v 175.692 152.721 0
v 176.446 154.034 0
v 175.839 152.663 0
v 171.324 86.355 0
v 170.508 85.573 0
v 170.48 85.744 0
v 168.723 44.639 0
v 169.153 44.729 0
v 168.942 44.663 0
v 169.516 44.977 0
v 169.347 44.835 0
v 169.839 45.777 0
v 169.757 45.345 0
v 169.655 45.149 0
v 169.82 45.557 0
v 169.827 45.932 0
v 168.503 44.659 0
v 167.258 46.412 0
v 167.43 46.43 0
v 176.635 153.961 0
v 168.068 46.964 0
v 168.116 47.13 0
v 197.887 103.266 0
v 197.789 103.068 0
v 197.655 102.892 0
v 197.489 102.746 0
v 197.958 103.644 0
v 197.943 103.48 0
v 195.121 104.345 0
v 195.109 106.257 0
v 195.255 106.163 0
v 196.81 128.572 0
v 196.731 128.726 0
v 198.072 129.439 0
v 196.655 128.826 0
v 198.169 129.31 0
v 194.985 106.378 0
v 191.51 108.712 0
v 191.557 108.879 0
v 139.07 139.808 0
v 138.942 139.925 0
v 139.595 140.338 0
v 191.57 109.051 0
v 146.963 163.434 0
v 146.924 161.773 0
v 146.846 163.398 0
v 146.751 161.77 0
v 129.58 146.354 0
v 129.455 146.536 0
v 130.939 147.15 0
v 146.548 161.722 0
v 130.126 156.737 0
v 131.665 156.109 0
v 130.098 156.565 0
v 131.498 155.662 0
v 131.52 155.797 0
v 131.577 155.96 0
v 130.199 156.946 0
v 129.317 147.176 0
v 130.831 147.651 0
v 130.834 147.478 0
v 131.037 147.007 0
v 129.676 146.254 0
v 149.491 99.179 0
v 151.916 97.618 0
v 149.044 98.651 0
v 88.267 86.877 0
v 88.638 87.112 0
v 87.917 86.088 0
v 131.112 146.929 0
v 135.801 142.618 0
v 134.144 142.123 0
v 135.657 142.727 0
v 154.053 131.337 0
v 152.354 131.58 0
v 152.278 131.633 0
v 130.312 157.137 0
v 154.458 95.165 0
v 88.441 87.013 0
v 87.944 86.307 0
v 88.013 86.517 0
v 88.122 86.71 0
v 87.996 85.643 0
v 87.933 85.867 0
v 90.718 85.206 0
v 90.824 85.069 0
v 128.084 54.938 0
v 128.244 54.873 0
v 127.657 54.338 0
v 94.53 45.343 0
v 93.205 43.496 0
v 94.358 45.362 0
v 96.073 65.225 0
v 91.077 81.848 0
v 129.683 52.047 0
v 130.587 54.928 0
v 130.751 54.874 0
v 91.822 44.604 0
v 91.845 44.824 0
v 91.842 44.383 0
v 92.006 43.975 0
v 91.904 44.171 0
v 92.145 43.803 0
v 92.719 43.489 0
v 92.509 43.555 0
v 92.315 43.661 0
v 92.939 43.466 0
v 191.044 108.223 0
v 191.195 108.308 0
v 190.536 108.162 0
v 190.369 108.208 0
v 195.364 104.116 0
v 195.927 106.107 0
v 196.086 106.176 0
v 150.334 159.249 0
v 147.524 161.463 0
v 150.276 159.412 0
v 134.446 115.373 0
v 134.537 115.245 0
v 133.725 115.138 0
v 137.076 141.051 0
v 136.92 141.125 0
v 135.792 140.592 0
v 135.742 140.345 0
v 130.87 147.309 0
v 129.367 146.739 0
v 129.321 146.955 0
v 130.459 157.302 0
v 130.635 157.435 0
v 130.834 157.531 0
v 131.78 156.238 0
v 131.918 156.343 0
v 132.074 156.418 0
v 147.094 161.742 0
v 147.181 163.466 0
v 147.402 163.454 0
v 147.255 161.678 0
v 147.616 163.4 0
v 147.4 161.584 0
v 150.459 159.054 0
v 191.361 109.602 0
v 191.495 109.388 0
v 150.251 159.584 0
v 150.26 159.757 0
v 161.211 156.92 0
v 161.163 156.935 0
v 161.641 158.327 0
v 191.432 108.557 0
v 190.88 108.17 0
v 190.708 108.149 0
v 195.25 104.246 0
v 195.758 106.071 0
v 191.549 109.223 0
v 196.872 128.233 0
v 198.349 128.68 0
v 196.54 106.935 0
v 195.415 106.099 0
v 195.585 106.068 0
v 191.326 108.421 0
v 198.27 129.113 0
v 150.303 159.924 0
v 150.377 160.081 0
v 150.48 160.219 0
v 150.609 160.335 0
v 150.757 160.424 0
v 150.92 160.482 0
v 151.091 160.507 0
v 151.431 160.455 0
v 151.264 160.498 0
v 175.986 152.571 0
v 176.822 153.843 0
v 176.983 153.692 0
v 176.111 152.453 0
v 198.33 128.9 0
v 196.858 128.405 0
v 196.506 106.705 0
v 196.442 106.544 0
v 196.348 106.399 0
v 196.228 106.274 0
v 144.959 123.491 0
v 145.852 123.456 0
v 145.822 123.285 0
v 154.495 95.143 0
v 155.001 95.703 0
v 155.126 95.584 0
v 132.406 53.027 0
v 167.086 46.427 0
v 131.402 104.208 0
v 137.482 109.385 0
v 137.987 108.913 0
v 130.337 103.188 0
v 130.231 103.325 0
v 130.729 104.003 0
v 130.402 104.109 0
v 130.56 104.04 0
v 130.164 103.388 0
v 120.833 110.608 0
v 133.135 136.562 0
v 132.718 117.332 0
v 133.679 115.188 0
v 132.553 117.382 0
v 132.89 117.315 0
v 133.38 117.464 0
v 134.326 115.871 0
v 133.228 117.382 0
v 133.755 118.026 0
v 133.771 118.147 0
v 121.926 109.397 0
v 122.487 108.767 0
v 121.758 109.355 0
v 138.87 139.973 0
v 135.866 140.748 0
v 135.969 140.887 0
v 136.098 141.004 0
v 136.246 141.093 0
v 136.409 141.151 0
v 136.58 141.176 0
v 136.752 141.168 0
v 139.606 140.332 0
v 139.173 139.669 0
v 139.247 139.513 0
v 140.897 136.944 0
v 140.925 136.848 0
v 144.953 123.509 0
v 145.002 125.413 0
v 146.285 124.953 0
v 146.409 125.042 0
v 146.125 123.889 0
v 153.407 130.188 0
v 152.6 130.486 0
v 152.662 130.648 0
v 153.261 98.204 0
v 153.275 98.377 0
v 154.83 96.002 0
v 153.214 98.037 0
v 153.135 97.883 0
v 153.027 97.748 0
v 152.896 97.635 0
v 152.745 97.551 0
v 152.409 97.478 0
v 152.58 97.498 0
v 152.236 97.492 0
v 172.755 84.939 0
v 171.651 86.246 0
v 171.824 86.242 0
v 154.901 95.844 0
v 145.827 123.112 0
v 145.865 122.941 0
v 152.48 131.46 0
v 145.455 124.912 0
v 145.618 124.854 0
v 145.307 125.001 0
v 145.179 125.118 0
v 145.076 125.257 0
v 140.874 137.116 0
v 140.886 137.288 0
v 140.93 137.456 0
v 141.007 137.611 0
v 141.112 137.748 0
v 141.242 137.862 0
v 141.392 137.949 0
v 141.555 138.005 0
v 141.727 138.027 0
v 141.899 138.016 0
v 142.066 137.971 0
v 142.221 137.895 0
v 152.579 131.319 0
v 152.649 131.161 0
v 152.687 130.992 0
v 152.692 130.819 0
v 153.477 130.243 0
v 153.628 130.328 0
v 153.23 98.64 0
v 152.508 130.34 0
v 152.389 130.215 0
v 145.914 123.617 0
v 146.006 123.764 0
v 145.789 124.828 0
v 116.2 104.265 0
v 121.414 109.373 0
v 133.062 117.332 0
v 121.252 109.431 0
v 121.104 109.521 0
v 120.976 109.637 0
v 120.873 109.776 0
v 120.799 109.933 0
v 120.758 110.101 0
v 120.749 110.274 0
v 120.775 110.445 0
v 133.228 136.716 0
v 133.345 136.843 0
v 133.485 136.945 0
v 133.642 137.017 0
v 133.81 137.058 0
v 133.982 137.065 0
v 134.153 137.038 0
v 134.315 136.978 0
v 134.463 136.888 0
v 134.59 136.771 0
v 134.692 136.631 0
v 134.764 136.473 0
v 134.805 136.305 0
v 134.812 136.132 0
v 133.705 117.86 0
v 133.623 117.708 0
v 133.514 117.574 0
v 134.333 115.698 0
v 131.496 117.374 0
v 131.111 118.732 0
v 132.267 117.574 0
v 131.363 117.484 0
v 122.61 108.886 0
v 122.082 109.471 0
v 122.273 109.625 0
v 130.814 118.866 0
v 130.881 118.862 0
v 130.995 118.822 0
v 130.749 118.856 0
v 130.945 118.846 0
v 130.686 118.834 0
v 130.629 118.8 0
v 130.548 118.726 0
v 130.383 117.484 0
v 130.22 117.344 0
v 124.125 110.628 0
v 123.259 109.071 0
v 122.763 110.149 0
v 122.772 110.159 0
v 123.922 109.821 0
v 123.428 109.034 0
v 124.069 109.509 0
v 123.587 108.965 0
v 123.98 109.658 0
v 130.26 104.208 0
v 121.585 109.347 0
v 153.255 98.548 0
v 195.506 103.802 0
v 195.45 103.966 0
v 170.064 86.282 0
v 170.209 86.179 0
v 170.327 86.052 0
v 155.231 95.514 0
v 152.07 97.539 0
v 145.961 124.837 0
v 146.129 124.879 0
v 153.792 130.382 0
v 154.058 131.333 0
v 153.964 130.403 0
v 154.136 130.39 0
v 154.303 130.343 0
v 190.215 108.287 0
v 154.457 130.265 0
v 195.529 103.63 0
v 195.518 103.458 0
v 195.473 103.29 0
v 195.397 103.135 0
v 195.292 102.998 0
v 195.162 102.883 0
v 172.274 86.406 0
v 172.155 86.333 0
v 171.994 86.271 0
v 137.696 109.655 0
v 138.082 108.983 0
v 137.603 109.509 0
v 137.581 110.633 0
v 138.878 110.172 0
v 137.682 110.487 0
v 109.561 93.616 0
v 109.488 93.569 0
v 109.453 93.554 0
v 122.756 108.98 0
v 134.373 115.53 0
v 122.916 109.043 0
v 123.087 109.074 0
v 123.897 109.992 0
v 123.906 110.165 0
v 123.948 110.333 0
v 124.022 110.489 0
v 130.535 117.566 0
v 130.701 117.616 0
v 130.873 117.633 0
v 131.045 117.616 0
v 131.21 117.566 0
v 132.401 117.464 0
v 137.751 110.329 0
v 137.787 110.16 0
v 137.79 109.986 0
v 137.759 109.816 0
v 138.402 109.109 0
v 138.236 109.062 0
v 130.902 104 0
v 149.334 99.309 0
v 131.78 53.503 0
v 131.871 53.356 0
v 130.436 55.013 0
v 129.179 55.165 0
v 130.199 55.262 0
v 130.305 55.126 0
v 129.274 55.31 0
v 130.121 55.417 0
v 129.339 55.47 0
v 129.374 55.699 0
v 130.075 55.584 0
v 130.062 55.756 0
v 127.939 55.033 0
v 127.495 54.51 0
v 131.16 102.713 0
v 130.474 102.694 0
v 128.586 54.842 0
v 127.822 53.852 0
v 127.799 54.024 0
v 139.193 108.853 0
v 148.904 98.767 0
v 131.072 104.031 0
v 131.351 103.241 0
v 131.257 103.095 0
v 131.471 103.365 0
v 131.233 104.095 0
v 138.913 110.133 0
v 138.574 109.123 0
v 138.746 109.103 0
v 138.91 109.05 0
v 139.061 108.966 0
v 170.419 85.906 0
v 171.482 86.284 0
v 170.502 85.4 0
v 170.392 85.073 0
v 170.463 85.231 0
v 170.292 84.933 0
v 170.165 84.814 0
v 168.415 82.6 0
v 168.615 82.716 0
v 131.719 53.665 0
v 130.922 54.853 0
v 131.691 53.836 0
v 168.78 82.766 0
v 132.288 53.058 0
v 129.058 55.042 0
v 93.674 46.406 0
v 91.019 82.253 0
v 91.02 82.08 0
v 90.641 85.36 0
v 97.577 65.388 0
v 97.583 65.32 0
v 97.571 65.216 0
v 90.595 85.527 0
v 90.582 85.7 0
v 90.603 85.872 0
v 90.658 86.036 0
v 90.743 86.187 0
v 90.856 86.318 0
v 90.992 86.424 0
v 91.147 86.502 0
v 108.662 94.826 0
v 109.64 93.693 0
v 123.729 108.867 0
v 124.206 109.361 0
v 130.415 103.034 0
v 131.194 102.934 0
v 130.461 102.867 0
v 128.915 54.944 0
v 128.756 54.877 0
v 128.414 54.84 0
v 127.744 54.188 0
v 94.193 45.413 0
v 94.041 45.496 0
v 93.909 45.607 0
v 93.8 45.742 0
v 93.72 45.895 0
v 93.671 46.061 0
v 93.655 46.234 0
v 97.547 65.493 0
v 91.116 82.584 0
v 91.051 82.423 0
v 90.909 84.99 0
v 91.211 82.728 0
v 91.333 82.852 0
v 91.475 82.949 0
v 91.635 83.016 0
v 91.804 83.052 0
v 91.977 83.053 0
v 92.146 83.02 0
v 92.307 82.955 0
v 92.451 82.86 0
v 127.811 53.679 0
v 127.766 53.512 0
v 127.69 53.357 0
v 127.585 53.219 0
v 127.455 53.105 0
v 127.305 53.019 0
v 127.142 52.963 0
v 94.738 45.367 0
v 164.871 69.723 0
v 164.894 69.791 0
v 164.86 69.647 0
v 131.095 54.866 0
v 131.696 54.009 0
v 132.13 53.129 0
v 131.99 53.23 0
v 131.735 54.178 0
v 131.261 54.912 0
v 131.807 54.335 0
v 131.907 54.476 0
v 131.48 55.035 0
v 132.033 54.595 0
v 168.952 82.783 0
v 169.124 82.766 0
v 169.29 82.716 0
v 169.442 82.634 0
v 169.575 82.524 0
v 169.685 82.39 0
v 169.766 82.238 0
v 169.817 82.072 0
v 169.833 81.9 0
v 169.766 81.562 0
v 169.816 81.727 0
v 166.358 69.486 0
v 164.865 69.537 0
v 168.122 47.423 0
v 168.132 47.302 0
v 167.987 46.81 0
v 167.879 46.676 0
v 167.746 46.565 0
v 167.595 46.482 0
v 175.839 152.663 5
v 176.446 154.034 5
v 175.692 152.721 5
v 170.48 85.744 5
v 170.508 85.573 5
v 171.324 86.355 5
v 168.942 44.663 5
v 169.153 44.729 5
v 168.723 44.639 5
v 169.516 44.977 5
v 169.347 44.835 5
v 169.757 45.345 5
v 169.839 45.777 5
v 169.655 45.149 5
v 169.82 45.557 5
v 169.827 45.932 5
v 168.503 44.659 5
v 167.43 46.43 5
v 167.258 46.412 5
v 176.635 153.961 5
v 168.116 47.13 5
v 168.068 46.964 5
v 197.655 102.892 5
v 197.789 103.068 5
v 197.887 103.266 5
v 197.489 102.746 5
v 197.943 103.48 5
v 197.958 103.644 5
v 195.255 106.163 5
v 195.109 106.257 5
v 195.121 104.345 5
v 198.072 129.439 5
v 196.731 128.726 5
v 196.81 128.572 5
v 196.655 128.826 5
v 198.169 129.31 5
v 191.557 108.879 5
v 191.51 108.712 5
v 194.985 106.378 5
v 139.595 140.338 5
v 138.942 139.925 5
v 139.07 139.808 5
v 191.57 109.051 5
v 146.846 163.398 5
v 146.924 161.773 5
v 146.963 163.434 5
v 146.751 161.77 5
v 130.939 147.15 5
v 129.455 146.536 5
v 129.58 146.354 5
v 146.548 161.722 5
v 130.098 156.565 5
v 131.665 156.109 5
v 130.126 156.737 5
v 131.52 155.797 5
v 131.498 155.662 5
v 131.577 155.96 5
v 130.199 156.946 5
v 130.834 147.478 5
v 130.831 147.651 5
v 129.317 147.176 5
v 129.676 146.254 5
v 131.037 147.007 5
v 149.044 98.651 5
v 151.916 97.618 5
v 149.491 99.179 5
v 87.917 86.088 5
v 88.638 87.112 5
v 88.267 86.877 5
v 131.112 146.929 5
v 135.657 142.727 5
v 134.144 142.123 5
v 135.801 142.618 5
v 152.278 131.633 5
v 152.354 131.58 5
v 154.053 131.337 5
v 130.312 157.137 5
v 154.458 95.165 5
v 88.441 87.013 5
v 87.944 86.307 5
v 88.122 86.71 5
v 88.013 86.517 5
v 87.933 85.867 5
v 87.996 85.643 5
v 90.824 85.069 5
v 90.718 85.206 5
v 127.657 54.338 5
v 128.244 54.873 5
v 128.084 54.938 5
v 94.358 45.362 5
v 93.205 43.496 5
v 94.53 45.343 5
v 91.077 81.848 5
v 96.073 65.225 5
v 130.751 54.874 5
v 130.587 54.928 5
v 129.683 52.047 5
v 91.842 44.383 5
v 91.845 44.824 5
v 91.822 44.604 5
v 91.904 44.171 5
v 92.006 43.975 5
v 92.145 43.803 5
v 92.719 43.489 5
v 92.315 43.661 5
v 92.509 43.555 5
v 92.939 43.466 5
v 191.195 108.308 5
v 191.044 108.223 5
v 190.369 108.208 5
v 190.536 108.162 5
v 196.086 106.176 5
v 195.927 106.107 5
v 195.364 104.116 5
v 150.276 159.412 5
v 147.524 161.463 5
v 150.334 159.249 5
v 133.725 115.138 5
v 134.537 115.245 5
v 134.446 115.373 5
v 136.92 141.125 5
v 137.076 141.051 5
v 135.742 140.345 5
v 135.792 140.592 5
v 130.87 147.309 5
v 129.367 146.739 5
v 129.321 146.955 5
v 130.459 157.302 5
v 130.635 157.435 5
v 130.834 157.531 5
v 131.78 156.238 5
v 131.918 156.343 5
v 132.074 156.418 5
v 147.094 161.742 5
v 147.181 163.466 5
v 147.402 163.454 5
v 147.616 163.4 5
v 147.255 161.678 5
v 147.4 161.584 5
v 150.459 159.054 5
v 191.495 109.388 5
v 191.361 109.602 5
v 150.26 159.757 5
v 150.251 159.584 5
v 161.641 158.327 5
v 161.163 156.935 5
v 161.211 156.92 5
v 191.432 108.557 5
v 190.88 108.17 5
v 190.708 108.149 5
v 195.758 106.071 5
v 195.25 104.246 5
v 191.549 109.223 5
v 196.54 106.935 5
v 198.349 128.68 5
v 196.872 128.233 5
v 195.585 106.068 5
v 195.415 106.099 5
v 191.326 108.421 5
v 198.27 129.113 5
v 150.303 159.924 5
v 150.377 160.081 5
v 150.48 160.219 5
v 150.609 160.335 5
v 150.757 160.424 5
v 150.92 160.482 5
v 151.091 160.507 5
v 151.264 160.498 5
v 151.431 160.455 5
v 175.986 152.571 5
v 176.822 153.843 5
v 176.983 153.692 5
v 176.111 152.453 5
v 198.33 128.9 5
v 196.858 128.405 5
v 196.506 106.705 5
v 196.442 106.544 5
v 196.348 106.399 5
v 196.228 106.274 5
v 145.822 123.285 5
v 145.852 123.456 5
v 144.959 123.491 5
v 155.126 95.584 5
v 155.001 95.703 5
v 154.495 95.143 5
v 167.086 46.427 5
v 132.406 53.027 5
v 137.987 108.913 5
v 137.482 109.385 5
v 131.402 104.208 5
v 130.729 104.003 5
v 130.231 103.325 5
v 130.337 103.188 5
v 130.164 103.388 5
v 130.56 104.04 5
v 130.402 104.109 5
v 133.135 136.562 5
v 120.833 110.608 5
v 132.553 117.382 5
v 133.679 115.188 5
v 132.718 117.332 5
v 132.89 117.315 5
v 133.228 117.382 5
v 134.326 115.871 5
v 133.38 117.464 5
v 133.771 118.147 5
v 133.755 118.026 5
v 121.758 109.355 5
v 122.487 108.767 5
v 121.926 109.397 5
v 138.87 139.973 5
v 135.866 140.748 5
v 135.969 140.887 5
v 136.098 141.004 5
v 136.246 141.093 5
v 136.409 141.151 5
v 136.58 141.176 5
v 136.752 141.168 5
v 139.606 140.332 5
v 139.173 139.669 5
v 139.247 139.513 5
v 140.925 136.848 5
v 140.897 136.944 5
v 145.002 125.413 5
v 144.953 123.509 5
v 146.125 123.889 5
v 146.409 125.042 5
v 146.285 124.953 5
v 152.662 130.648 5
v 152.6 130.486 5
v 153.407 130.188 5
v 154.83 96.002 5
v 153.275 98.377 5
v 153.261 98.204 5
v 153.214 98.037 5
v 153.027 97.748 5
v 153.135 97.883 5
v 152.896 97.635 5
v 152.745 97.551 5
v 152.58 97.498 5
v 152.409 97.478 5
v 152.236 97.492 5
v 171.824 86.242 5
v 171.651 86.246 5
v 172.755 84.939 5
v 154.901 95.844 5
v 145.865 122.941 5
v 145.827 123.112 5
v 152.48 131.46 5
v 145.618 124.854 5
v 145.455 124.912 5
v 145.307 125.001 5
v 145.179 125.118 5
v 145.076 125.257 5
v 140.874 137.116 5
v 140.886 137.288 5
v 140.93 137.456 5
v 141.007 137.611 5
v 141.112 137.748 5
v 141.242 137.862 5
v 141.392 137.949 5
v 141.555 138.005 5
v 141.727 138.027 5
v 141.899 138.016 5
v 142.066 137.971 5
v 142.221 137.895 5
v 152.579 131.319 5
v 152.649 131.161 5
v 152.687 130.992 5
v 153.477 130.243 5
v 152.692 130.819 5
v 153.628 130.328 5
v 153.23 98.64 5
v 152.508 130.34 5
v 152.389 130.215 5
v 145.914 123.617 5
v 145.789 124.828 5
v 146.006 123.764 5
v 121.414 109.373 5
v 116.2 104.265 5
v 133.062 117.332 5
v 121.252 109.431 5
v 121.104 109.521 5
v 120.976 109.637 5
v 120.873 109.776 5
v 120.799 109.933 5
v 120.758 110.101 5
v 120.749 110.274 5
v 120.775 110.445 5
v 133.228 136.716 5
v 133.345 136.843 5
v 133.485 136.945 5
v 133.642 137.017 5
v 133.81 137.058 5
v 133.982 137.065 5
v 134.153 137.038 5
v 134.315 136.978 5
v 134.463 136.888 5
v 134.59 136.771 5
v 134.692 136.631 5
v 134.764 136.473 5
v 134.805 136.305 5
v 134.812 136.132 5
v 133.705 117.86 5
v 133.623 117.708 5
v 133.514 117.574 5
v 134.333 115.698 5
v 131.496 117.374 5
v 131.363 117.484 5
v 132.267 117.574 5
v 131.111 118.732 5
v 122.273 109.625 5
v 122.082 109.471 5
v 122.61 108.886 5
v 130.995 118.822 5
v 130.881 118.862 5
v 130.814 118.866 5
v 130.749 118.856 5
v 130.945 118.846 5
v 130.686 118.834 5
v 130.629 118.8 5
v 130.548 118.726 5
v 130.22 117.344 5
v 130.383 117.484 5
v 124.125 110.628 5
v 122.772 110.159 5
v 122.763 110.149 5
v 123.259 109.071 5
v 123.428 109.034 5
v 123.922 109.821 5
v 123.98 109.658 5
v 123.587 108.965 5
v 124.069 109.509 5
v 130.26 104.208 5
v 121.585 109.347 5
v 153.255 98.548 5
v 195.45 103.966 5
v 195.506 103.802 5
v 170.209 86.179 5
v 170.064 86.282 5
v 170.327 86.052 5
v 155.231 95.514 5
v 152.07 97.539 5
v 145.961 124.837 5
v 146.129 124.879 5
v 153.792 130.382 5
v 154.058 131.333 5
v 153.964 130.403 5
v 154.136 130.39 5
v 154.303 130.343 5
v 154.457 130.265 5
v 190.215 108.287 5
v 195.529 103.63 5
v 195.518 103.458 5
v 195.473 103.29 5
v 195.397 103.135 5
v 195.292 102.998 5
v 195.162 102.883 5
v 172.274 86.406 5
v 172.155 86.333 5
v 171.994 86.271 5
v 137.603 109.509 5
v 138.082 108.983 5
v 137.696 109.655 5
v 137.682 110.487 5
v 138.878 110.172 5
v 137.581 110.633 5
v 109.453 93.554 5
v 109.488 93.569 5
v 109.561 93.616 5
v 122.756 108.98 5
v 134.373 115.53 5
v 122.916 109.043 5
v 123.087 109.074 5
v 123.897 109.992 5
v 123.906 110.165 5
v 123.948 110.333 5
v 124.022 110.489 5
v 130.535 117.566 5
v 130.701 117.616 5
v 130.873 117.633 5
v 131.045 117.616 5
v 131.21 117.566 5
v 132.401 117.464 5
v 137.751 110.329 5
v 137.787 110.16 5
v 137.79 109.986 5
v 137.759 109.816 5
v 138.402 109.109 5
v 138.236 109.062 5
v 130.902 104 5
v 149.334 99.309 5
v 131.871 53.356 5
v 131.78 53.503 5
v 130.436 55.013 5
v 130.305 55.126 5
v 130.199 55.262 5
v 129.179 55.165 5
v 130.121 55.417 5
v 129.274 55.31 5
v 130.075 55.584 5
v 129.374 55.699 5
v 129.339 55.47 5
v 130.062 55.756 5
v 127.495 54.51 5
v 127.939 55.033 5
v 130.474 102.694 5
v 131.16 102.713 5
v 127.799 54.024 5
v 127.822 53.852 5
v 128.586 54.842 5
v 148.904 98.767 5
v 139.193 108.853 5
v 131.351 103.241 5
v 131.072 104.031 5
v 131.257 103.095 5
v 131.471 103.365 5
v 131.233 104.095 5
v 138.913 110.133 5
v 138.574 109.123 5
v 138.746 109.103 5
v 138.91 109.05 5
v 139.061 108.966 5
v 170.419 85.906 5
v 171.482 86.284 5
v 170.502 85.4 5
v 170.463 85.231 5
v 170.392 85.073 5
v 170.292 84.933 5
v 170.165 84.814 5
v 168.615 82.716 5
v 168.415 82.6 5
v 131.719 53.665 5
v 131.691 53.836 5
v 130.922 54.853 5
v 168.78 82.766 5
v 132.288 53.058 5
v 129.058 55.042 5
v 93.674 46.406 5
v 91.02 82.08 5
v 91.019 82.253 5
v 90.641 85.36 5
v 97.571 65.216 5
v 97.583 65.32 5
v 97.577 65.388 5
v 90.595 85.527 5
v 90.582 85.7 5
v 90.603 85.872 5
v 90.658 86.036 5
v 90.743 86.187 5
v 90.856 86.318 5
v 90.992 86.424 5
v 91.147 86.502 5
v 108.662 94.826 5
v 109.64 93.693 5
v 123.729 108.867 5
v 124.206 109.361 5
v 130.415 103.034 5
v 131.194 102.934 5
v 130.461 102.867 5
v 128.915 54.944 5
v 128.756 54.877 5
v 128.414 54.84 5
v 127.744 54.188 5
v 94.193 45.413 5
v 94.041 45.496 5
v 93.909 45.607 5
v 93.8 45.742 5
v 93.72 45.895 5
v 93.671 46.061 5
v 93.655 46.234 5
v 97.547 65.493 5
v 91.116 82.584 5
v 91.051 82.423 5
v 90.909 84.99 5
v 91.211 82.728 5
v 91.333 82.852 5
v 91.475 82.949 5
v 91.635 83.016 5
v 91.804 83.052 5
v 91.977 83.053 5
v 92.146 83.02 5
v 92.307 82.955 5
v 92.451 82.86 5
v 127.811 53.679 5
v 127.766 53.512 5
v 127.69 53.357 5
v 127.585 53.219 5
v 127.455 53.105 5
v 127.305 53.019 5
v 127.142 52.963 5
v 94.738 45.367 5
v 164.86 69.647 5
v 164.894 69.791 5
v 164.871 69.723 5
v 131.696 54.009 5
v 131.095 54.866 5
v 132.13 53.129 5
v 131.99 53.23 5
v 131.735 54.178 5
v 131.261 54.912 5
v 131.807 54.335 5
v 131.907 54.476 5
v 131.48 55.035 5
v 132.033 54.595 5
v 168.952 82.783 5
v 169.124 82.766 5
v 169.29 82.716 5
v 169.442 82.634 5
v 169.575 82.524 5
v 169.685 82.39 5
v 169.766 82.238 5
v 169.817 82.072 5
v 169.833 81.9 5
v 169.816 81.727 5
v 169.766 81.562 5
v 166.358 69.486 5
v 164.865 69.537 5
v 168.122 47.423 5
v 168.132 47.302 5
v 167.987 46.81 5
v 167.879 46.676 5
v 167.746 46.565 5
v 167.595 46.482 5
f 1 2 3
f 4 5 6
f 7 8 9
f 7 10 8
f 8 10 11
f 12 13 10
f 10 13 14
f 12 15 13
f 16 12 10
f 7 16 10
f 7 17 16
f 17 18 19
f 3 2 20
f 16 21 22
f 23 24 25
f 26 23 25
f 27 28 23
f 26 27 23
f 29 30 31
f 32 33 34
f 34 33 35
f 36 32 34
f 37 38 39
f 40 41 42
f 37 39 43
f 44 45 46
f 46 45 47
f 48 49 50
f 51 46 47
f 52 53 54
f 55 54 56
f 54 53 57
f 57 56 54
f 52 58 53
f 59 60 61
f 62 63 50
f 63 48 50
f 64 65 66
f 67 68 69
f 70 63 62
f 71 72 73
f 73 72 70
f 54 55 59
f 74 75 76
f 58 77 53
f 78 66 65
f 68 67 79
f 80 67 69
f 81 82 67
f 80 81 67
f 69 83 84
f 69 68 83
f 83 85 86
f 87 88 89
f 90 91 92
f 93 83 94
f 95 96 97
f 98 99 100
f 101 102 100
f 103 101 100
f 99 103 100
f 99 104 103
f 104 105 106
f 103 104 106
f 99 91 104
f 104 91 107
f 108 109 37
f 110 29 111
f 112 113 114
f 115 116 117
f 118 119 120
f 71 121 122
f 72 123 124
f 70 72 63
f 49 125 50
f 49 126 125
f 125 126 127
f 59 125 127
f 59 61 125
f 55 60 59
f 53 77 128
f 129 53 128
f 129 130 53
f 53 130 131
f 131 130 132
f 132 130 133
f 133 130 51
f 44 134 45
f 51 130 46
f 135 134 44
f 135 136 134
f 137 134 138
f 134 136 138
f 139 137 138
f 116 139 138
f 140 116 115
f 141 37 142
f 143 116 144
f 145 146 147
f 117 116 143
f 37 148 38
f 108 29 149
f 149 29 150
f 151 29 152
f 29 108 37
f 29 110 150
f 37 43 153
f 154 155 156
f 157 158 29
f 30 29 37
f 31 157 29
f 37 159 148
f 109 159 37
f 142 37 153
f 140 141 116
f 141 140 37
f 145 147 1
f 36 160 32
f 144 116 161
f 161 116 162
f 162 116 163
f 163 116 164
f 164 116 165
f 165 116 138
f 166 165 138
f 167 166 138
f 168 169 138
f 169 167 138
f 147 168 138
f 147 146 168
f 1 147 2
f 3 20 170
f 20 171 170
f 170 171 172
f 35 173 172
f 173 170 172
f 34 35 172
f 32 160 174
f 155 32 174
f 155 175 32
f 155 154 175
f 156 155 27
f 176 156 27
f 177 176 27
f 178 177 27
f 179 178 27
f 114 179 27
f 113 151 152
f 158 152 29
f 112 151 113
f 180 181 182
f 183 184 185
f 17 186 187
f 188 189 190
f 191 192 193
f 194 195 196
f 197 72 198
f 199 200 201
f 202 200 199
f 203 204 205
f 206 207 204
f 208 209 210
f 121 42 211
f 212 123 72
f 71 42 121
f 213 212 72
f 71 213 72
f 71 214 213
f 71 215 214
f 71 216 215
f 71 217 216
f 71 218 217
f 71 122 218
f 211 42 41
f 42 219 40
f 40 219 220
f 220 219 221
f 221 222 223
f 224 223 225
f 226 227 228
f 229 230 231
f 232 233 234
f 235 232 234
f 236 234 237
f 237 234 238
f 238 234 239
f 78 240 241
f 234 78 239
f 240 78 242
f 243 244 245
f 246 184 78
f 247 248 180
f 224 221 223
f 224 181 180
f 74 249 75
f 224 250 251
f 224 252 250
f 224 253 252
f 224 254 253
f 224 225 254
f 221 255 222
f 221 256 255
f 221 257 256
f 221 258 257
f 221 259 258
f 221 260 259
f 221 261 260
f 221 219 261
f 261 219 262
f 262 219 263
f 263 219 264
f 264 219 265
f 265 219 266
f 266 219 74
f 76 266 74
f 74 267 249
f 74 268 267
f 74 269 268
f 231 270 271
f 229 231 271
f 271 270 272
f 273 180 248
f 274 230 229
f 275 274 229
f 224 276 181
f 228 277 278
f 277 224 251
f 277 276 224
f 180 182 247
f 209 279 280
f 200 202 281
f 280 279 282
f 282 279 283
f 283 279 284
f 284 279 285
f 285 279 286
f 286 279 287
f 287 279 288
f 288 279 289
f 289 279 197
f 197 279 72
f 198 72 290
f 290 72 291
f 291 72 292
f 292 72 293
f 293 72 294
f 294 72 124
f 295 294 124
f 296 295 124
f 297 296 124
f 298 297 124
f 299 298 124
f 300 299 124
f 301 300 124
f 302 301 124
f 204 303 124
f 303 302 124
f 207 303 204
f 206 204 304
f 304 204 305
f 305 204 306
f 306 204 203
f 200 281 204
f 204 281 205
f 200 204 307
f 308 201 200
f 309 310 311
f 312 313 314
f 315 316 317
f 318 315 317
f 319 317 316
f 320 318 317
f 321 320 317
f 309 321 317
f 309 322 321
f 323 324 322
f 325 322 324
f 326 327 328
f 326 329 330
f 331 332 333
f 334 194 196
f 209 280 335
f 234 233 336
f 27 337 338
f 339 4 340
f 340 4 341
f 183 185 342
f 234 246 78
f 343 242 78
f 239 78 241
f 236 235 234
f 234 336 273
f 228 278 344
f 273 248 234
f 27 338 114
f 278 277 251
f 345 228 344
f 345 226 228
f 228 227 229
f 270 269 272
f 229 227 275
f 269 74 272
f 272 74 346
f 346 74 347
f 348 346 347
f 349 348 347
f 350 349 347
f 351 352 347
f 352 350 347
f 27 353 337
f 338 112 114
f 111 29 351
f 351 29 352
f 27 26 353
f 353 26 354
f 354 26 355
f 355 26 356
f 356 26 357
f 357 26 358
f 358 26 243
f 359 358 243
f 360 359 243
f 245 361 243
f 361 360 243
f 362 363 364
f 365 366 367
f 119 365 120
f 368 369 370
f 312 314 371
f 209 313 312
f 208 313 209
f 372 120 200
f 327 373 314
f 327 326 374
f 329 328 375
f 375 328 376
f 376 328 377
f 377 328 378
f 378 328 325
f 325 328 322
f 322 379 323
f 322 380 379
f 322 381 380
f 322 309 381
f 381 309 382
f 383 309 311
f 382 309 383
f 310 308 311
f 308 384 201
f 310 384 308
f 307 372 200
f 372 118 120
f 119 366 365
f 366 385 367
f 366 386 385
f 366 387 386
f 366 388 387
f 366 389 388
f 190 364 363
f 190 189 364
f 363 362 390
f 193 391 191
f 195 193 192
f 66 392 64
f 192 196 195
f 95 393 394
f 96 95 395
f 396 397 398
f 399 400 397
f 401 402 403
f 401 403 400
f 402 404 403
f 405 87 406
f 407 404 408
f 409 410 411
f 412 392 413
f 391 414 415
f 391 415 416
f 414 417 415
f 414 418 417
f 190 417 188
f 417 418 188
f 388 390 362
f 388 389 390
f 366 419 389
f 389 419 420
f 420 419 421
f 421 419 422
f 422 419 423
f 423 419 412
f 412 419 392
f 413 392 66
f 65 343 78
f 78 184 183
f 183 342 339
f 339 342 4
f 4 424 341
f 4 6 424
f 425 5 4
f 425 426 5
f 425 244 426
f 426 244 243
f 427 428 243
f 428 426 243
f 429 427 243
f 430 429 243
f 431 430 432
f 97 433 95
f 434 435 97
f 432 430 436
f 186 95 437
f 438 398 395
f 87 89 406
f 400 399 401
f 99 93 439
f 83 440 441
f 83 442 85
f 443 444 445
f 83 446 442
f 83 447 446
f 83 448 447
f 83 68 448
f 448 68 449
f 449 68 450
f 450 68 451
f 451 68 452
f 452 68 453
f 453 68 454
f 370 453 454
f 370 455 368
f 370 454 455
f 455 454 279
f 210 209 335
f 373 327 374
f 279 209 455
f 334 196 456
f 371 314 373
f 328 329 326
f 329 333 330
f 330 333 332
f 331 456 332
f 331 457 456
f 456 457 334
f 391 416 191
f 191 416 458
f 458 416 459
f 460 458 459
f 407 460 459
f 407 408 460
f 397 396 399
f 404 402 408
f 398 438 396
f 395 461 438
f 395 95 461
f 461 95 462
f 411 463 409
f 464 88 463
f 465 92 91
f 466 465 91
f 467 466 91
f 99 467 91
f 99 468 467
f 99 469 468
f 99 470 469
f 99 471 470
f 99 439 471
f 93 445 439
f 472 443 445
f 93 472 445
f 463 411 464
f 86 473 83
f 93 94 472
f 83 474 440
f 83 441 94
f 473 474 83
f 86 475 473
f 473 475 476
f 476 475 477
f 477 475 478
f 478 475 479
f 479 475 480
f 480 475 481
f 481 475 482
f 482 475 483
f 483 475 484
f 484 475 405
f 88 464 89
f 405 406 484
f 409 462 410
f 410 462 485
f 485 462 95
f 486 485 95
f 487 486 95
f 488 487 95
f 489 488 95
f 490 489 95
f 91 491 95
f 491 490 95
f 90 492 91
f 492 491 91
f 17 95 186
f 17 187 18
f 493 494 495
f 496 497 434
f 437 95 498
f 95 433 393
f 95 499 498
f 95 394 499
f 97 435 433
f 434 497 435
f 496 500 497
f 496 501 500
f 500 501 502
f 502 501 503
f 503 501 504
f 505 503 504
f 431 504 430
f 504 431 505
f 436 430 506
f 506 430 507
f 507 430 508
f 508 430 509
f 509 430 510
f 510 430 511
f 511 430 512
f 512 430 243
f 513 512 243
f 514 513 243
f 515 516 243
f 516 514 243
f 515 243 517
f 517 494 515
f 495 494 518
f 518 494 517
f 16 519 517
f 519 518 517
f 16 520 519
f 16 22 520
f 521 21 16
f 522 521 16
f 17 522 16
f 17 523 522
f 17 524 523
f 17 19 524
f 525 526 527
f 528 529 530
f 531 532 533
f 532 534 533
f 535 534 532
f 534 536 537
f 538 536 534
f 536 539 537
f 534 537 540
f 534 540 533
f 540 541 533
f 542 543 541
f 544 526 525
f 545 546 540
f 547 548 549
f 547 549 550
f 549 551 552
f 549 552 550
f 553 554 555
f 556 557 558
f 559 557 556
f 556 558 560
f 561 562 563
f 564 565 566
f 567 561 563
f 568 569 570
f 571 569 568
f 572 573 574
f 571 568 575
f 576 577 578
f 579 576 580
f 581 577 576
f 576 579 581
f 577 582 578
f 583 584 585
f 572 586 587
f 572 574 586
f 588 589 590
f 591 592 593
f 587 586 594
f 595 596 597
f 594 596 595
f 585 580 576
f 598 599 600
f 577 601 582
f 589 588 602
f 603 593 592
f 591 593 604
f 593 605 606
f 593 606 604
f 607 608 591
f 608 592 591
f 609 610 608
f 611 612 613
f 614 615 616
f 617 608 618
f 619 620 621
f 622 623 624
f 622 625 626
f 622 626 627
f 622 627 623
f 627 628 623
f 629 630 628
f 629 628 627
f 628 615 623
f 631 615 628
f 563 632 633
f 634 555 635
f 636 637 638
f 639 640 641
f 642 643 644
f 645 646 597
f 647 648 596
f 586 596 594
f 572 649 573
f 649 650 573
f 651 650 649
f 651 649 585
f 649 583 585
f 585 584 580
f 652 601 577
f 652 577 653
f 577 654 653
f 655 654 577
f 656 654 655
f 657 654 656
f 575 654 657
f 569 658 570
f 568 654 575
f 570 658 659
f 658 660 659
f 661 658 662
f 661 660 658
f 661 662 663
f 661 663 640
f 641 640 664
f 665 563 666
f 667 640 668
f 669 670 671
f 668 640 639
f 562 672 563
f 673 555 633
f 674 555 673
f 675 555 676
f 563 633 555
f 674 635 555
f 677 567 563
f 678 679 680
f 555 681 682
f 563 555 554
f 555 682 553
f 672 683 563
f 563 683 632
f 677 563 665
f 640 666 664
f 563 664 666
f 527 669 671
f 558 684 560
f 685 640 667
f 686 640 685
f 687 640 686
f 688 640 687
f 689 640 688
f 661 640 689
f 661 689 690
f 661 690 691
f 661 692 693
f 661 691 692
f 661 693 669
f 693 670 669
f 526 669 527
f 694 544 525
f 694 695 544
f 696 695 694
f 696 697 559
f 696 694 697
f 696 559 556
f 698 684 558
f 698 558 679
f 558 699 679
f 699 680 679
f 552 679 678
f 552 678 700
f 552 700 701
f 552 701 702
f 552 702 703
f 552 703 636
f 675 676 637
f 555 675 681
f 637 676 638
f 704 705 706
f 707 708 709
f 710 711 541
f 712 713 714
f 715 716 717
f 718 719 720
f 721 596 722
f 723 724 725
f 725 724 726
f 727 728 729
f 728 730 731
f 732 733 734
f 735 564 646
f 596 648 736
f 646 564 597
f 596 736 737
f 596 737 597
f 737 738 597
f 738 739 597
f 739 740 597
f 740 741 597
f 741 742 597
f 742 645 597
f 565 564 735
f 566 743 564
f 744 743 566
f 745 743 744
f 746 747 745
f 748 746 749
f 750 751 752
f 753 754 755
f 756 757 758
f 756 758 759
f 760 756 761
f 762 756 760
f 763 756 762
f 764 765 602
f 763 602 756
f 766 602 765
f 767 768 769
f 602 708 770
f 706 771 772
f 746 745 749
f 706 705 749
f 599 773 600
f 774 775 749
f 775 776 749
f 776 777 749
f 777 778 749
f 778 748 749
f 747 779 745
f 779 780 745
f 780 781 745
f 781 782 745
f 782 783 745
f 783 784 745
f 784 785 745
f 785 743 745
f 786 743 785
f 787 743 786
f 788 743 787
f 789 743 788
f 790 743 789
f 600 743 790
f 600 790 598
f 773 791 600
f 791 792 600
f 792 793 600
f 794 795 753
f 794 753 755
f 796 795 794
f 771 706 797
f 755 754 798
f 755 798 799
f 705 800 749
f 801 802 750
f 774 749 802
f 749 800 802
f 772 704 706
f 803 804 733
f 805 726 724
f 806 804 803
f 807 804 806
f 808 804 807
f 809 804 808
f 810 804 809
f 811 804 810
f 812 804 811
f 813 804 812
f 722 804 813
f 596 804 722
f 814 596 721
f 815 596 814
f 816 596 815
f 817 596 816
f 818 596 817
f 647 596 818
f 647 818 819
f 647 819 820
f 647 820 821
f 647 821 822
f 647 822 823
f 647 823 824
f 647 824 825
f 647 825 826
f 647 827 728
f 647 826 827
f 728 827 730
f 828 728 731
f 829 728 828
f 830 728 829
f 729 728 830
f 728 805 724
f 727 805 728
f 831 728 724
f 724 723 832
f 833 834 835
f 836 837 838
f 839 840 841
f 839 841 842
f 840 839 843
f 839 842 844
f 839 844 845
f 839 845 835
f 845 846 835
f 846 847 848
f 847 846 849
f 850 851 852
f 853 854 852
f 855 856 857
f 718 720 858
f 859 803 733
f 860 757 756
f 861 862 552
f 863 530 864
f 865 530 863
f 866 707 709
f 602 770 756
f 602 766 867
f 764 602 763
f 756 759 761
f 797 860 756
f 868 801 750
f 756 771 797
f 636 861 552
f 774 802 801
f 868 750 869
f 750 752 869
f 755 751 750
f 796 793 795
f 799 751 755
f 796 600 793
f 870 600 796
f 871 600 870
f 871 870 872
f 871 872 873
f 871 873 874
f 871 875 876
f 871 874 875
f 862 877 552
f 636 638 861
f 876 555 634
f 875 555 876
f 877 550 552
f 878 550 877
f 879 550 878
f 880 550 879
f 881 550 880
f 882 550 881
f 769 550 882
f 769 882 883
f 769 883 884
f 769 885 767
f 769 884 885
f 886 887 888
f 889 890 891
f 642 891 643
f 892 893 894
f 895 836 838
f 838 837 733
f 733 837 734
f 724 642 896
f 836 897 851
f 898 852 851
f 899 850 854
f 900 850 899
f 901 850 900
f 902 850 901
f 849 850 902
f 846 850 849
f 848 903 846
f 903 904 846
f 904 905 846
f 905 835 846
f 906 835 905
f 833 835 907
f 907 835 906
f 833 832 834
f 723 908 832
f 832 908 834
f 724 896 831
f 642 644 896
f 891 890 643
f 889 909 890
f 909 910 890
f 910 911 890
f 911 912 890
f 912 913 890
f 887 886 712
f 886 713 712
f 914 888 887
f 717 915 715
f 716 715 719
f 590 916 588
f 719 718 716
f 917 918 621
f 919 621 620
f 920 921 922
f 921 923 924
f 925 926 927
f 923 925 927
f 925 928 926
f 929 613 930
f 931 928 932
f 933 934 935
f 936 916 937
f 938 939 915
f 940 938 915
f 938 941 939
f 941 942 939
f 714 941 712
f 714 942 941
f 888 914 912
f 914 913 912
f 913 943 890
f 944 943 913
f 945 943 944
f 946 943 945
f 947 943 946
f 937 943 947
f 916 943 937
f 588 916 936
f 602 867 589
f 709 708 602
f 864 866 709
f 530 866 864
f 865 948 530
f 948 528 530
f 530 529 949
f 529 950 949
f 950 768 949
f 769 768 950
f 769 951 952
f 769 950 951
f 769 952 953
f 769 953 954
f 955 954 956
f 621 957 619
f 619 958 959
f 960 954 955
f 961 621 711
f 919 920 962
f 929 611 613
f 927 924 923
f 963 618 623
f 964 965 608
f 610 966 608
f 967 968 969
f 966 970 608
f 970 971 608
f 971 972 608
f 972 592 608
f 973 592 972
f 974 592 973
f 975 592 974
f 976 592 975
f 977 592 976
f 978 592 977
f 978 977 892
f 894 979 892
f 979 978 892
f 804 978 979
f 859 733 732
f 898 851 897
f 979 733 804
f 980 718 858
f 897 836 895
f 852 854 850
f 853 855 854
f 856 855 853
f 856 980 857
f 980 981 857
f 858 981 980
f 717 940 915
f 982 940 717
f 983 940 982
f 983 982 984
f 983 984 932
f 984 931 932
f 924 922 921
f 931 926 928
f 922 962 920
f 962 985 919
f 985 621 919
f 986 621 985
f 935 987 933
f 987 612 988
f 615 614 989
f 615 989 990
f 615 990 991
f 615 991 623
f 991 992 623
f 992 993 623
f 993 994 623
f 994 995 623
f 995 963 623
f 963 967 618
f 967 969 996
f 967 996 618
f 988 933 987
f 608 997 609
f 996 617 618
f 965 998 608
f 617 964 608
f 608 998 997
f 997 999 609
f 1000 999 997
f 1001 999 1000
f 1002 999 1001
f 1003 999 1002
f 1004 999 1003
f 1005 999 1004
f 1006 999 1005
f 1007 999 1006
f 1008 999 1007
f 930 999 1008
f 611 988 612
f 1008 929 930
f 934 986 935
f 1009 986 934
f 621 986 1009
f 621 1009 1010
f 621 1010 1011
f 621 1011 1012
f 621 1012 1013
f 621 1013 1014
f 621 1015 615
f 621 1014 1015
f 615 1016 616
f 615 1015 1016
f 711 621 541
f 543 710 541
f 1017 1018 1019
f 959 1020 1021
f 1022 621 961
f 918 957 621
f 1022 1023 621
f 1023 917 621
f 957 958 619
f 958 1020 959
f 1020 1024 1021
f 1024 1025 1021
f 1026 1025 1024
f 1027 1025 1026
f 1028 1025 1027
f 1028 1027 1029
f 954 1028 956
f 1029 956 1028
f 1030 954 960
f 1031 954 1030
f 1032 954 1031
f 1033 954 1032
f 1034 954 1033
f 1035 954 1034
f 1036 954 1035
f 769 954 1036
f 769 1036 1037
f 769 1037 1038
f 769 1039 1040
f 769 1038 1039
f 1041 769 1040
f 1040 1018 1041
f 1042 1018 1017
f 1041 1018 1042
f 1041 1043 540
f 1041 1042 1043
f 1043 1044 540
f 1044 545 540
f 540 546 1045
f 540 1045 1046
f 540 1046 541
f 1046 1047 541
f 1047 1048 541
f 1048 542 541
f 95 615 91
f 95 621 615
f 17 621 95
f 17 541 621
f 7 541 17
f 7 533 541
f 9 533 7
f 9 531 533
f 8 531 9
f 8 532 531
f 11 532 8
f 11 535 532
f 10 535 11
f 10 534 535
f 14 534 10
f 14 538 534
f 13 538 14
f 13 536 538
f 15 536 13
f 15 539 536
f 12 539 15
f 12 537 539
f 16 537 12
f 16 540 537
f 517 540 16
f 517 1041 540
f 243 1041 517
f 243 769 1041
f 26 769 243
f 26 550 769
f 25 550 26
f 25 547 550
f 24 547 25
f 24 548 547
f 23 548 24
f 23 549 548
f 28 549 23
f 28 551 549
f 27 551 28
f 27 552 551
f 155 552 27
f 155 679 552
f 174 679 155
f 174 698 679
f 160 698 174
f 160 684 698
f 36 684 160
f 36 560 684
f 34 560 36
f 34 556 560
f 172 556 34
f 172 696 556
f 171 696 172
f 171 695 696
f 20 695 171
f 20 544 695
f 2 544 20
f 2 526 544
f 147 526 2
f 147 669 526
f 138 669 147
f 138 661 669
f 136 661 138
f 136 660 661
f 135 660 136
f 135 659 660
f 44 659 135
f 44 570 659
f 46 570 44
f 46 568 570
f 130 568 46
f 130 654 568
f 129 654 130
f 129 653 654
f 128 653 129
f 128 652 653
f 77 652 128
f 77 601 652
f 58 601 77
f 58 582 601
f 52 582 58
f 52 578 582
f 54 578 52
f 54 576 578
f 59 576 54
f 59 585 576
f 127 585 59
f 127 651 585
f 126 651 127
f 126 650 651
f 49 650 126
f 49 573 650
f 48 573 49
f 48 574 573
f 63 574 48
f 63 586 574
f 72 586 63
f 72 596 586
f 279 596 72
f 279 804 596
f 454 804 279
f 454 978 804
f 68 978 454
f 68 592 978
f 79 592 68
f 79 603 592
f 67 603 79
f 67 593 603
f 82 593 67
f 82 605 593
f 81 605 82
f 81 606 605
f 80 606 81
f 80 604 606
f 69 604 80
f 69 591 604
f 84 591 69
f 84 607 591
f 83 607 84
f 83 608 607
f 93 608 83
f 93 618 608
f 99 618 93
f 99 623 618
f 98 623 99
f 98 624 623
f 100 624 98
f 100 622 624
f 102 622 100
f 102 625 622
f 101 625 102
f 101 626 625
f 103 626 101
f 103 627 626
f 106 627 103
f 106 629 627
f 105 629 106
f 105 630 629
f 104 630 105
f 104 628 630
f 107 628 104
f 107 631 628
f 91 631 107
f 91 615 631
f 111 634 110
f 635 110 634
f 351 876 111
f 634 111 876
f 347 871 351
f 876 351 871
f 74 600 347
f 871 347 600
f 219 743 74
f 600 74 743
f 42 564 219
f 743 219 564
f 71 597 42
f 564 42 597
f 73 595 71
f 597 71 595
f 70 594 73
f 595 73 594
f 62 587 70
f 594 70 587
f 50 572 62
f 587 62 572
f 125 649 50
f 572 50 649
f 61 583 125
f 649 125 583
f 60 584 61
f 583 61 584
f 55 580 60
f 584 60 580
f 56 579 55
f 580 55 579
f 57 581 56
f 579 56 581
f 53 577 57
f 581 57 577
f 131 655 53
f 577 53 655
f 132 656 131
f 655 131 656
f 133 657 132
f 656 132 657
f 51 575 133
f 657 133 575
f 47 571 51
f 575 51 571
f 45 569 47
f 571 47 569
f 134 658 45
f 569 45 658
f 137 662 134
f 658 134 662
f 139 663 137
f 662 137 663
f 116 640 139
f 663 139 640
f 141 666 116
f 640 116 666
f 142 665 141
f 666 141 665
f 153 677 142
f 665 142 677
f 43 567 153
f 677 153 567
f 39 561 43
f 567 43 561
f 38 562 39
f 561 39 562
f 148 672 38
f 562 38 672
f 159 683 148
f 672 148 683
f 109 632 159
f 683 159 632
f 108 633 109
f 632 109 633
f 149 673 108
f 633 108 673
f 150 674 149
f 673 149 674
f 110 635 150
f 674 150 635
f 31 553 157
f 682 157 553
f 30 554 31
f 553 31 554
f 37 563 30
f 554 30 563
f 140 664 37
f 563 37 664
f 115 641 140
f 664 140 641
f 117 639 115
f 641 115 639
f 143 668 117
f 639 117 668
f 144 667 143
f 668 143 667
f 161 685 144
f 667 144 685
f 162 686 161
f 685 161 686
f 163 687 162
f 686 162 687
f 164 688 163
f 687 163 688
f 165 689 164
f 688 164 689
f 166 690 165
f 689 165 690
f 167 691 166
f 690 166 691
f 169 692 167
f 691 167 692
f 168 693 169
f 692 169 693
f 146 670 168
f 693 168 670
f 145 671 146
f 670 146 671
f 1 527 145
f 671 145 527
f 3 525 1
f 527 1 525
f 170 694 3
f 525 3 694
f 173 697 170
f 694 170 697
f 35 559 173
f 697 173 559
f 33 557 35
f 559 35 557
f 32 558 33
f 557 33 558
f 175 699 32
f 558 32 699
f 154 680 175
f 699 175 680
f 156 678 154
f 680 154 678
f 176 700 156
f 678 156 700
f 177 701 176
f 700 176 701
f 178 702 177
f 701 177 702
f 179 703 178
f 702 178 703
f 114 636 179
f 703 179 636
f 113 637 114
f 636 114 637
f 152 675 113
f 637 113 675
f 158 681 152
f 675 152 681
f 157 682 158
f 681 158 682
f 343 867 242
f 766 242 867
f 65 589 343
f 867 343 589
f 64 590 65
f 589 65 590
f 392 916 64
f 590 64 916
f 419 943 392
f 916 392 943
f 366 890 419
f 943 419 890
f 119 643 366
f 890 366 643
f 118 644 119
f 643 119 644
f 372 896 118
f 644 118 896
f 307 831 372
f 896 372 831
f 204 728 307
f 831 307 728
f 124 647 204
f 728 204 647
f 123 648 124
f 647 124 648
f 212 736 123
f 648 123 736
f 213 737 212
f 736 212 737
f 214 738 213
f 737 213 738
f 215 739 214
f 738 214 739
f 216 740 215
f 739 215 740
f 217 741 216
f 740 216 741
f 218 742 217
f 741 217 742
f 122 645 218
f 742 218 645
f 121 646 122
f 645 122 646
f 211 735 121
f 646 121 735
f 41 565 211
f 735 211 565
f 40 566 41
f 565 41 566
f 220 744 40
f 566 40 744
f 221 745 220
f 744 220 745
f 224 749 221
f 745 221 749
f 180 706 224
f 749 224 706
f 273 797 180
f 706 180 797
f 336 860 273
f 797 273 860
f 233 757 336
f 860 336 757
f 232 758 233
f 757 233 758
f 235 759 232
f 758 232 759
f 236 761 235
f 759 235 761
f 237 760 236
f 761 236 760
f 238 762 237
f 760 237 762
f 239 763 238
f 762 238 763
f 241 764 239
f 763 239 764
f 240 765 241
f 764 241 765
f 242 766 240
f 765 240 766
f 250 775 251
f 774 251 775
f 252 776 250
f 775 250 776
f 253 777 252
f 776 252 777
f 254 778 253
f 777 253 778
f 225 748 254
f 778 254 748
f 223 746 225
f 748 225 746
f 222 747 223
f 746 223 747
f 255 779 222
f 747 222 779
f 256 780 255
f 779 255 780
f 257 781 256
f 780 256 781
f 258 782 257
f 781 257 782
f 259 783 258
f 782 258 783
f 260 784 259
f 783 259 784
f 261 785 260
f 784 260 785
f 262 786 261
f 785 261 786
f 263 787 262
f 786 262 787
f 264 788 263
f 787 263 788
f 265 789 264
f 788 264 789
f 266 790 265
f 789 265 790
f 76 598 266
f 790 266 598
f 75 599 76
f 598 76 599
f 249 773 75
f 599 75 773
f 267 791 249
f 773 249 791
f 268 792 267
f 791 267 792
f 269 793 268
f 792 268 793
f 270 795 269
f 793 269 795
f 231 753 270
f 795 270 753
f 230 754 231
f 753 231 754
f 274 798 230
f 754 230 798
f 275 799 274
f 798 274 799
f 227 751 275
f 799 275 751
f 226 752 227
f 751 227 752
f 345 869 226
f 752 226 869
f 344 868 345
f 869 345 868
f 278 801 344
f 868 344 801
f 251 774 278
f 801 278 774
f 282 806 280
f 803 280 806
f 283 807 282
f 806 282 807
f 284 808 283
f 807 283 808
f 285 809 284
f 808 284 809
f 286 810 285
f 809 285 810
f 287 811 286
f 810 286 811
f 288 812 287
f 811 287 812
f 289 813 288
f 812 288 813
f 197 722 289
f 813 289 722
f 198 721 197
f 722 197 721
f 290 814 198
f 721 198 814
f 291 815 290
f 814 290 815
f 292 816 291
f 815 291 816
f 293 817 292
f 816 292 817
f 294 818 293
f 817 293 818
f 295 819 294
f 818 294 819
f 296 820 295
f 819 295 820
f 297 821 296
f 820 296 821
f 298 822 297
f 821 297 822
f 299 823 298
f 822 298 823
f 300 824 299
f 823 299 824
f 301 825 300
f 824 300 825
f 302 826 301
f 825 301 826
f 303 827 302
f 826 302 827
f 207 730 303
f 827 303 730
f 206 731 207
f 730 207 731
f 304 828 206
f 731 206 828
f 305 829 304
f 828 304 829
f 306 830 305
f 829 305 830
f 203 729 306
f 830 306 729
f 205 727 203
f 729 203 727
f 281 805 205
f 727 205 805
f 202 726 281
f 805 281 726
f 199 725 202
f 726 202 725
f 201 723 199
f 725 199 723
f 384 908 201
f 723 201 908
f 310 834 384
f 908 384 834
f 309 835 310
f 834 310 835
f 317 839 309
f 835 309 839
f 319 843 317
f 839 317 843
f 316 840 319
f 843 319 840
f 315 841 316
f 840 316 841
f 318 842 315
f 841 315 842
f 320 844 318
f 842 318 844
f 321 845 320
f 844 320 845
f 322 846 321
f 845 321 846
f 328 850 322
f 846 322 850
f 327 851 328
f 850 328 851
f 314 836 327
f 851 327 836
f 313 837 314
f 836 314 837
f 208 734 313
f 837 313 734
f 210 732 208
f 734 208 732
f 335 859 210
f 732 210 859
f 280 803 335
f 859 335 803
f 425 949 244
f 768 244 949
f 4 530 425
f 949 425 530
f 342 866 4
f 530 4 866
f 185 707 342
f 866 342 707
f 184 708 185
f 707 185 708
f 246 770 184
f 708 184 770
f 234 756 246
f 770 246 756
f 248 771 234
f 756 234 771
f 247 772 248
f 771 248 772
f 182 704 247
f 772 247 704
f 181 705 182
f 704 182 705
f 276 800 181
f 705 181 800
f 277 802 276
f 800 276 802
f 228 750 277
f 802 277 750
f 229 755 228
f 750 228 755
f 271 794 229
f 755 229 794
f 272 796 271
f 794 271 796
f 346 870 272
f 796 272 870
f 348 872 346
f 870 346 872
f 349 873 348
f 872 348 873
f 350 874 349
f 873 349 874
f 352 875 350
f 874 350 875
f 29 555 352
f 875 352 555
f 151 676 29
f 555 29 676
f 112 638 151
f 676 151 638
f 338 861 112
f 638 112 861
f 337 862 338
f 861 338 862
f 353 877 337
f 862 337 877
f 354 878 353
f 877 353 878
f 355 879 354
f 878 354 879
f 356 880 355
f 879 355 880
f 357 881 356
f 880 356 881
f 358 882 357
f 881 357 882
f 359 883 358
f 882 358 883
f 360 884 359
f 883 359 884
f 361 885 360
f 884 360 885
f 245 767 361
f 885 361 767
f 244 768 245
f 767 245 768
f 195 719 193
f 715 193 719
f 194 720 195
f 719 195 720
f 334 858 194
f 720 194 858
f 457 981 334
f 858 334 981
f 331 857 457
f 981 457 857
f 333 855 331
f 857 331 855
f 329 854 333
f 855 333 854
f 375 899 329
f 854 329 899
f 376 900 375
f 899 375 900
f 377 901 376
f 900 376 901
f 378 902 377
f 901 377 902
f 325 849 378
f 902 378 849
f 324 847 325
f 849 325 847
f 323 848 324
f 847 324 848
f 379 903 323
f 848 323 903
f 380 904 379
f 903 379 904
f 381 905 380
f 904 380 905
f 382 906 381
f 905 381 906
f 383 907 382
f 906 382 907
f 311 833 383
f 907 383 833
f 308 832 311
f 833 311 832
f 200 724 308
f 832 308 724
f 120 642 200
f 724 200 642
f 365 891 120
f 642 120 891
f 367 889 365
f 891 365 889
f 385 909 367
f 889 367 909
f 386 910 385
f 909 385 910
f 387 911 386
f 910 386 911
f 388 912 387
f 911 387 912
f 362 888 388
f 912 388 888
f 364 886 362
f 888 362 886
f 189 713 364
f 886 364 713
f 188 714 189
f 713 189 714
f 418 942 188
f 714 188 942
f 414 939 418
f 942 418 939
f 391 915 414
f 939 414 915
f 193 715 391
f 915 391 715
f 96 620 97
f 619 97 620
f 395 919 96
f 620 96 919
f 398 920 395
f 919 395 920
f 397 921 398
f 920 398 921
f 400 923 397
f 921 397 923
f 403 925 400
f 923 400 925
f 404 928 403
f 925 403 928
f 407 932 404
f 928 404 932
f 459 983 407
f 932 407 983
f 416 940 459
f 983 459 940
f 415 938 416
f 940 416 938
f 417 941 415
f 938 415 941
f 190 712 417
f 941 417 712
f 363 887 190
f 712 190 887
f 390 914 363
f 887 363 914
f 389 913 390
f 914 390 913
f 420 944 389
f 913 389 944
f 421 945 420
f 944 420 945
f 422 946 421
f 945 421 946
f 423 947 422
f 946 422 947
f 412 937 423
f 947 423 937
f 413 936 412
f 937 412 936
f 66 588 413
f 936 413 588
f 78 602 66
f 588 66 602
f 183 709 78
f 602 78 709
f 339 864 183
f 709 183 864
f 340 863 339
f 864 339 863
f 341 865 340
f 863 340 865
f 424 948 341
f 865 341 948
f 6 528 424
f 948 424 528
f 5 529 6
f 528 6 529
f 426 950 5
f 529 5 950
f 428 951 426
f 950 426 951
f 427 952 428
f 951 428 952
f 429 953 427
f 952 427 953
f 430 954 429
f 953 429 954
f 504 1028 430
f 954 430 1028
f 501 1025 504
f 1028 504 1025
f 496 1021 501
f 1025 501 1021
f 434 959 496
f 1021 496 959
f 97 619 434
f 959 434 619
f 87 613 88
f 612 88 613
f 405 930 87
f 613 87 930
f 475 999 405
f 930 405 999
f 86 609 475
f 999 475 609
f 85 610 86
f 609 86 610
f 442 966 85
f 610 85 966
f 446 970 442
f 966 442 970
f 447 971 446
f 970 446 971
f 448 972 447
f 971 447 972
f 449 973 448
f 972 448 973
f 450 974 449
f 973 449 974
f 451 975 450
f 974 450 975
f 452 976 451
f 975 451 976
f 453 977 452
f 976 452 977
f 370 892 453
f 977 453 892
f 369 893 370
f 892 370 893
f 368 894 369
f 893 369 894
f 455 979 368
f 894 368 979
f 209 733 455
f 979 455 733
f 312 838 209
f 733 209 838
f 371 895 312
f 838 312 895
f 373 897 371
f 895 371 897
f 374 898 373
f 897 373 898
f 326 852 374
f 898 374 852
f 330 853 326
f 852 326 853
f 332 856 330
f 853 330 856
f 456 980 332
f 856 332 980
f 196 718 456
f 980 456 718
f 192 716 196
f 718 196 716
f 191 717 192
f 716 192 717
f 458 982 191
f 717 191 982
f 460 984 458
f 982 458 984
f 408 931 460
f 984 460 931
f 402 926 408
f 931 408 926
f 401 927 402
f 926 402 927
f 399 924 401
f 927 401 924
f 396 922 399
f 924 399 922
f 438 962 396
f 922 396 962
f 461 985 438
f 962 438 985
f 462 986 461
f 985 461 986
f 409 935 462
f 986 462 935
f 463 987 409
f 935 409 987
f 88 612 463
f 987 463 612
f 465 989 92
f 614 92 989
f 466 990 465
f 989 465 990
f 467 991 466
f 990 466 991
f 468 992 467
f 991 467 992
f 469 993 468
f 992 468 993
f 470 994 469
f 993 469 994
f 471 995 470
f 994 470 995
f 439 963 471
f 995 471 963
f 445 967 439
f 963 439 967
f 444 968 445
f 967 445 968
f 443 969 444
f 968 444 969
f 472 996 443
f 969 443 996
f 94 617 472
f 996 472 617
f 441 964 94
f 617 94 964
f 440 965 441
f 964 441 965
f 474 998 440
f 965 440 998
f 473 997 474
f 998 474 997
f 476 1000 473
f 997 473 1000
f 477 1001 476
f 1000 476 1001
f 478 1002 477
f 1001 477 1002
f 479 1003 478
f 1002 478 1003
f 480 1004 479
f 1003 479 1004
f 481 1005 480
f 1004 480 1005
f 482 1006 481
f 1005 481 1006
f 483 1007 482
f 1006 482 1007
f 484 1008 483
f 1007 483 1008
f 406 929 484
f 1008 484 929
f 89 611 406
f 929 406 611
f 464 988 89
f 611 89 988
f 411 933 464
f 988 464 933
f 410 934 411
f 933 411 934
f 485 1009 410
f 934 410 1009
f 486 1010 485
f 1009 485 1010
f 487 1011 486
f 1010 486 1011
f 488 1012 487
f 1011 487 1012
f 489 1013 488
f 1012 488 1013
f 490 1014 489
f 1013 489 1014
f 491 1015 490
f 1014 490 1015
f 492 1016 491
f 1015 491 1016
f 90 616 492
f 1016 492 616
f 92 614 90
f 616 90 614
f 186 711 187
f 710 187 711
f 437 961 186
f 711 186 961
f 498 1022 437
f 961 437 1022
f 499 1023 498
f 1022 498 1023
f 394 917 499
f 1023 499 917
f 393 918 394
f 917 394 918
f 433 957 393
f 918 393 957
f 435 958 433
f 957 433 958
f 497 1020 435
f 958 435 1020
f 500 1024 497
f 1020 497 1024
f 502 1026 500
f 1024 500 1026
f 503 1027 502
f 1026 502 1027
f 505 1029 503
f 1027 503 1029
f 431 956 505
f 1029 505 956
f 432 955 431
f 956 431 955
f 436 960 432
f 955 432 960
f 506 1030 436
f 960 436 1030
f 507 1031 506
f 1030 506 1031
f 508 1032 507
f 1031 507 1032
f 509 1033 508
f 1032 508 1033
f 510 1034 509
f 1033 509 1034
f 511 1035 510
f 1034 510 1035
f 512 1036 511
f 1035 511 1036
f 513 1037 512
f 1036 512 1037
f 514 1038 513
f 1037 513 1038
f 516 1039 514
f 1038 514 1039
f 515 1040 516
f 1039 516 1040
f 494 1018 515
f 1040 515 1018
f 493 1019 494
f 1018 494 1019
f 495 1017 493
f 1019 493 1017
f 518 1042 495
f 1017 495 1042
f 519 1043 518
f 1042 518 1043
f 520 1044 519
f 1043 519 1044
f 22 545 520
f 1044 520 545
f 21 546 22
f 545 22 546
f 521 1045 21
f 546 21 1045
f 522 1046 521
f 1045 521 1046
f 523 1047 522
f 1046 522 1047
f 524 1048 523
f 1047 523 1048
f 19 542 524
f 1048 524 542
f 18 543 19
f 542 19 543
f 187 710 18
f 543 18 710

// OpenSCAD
/*
 * Customizable Origami - Cute Fox - https://www.thingiverse.com/thing:2616323
 * by Dennis Hofmann - https://www.thingiverse.com/mightynozzle/about
 * created 2017-10-31
 * version v1.0
 *
 * Changelog
 * --------------
 * v1.0:
 *      - final design
 * --------------
 * 
 * This work is licensed under the Creative Commons - Attribution - NonCommercial - ShareAlike license.
 * https://creativecommons.org/licenses/by-nc-sa/3.0/
 */


 // Parameter Section //
//-------------------//

// preview[view:north, tilt:top]

// The maximum size of the longest side. The shorter side will be automatically resized in same ratio.
max_size_in_millimeter = 120; //[20:300]

// The height of the model.
model_height_in_millimeter = 5; //[0.2:0.2:100]

// Thickness of the outer outline.
outline_size_in_millimeter = 1.5; //[0.5:0.1:20]

// Thickness of the inner outline.
inline_size_in_millimeter = 0.7; //[0.5:0.1:20]

// Roundiness of the ends of the inner outlines.
inline_edge_radius_in_millimeter = 0.9; //[0.0:0.1:5]

// Flip model
flip_model = "no"; //[yes,no]

/*[hidden]*/
max_size = max_size_in_millimeter;
model_height = model_height_in_millimeter;
$fn=32;

// Outer Points
A1 = [238, 114];
A2 = [332, 136];
A3 = [432, 117];
A4 = [423, 178];
A5 = [440, 219];
A6 = [504, 265];
A7 = [505, 329];
A8 = [451, 391];
A9 = [413, 402];
A10 = [377, 415];
A11 = [336, 400];
A12 = [334, 376];
A13 = [347, 364];
A14 = [300, 265];
A15 = [280, 240];
A16 = [228, 220];
A17 = [249, 167];

outline = [A1, A2, A3, A4, A5, A6, A7, A8, A9, A10, A11, A12, A13, A14, A15, A16, A17];

// Inner Points
B1 = [315, 281];
B2 = [335, 264];
B3 = [355, 281];
B4 = [335, 303];
B5 = [343, 295];
B6 = [382, 253];
B7 = [396, 244];
B8 = [372, 316];
B9 = [357, 358];
B10 = [394, 335];

// Polygons
C1 = [A16, A17, A1, A2];
C2 = [A2, A3, A4, A5];
C3 = [A16, A2, B2, B1, A15];
C4 = [B2, A2, A5, B7, B6, B3];
C5 = [B1, B2, B3, B5, B4];
C6 = [A14, A13, B5, B4, B1];
C7 = [A13, B9, B8, B7, B6, B3, B5];
C8 = [B7, A5, A6, B10, B8];
C9 = [A6, A10, A9, A8, A7];
C10 = [A6, A10, A11, A12, A13, B9, B10];
C11 = [B9, B10, B8];

cut_polygons = [C1, C2, C3, C4, C5, C6, C7, C8, C9, C10, C11];

min_x = A16[0];
min_y = A1[1];
max_x = A7[0];
max_y = A10[1];

x_size = max_x - min_x;
y_size = max_y - min_y;

x_factor = max_size / x_size;
y_factor = max_size / y_size;

inline_size = x_size > y_size ? inline_size_in_millimeter / x_factor / 2: inline_size_in_millimeter / y_factor / 2;
inline_edge_radius = x_size > y_size ? inline_edge_radius_in_millimeter / x_factor: inline_edge_radius_in_millimeter / y_factor;
outline_size = x_size > y_size ? outline_size_in_millimeter / x_factor - inline_size: outline_size_in_millimeter / y_factor - inline_size;


 // Program Section //
//-----------------//

if(x_size > y_size) {
    resize(newsize=[max_size, x_factor * y_size, model_height]){
        if(flip_model == "yes") {
            mirror([0,1,0]) {
                rotate([180,180,0]) {    
                    create(outline, cut_polygons);
                }
            }
        } else {
            create(outline, cut_polygons);
        }
    }
} else {
    resize(newsize=[y_factor * x_size, max_size, model_height]){
        if(flip_model == "yes") {
            mirror([0,1,0]) {
                rotate([180,180,0]) {    
                    create(outline, cut_polygons);
                }
            }
        } else {
            create(outline, cut_polygons);
        }
    }
}


 // Module Section //
//----------------//

module create() {
    linear_extrude(height=1) {
        difference() {
            offset(r = -0) {
                offset(r = +outline_size) {
                    polygon(points = outline, convexity = 10);
                }
            }
            
            for(cut_polygon = [0:len(cut_polygons)]) {
                offset(r = +inline_edge_radius) {
                    offset(r = -inline_size - inline_edge_radius) {
                        polygon(points = cut_polygons[cut_polygon], convexity = 10);
                    }
                }
            }
        }
    }
}
